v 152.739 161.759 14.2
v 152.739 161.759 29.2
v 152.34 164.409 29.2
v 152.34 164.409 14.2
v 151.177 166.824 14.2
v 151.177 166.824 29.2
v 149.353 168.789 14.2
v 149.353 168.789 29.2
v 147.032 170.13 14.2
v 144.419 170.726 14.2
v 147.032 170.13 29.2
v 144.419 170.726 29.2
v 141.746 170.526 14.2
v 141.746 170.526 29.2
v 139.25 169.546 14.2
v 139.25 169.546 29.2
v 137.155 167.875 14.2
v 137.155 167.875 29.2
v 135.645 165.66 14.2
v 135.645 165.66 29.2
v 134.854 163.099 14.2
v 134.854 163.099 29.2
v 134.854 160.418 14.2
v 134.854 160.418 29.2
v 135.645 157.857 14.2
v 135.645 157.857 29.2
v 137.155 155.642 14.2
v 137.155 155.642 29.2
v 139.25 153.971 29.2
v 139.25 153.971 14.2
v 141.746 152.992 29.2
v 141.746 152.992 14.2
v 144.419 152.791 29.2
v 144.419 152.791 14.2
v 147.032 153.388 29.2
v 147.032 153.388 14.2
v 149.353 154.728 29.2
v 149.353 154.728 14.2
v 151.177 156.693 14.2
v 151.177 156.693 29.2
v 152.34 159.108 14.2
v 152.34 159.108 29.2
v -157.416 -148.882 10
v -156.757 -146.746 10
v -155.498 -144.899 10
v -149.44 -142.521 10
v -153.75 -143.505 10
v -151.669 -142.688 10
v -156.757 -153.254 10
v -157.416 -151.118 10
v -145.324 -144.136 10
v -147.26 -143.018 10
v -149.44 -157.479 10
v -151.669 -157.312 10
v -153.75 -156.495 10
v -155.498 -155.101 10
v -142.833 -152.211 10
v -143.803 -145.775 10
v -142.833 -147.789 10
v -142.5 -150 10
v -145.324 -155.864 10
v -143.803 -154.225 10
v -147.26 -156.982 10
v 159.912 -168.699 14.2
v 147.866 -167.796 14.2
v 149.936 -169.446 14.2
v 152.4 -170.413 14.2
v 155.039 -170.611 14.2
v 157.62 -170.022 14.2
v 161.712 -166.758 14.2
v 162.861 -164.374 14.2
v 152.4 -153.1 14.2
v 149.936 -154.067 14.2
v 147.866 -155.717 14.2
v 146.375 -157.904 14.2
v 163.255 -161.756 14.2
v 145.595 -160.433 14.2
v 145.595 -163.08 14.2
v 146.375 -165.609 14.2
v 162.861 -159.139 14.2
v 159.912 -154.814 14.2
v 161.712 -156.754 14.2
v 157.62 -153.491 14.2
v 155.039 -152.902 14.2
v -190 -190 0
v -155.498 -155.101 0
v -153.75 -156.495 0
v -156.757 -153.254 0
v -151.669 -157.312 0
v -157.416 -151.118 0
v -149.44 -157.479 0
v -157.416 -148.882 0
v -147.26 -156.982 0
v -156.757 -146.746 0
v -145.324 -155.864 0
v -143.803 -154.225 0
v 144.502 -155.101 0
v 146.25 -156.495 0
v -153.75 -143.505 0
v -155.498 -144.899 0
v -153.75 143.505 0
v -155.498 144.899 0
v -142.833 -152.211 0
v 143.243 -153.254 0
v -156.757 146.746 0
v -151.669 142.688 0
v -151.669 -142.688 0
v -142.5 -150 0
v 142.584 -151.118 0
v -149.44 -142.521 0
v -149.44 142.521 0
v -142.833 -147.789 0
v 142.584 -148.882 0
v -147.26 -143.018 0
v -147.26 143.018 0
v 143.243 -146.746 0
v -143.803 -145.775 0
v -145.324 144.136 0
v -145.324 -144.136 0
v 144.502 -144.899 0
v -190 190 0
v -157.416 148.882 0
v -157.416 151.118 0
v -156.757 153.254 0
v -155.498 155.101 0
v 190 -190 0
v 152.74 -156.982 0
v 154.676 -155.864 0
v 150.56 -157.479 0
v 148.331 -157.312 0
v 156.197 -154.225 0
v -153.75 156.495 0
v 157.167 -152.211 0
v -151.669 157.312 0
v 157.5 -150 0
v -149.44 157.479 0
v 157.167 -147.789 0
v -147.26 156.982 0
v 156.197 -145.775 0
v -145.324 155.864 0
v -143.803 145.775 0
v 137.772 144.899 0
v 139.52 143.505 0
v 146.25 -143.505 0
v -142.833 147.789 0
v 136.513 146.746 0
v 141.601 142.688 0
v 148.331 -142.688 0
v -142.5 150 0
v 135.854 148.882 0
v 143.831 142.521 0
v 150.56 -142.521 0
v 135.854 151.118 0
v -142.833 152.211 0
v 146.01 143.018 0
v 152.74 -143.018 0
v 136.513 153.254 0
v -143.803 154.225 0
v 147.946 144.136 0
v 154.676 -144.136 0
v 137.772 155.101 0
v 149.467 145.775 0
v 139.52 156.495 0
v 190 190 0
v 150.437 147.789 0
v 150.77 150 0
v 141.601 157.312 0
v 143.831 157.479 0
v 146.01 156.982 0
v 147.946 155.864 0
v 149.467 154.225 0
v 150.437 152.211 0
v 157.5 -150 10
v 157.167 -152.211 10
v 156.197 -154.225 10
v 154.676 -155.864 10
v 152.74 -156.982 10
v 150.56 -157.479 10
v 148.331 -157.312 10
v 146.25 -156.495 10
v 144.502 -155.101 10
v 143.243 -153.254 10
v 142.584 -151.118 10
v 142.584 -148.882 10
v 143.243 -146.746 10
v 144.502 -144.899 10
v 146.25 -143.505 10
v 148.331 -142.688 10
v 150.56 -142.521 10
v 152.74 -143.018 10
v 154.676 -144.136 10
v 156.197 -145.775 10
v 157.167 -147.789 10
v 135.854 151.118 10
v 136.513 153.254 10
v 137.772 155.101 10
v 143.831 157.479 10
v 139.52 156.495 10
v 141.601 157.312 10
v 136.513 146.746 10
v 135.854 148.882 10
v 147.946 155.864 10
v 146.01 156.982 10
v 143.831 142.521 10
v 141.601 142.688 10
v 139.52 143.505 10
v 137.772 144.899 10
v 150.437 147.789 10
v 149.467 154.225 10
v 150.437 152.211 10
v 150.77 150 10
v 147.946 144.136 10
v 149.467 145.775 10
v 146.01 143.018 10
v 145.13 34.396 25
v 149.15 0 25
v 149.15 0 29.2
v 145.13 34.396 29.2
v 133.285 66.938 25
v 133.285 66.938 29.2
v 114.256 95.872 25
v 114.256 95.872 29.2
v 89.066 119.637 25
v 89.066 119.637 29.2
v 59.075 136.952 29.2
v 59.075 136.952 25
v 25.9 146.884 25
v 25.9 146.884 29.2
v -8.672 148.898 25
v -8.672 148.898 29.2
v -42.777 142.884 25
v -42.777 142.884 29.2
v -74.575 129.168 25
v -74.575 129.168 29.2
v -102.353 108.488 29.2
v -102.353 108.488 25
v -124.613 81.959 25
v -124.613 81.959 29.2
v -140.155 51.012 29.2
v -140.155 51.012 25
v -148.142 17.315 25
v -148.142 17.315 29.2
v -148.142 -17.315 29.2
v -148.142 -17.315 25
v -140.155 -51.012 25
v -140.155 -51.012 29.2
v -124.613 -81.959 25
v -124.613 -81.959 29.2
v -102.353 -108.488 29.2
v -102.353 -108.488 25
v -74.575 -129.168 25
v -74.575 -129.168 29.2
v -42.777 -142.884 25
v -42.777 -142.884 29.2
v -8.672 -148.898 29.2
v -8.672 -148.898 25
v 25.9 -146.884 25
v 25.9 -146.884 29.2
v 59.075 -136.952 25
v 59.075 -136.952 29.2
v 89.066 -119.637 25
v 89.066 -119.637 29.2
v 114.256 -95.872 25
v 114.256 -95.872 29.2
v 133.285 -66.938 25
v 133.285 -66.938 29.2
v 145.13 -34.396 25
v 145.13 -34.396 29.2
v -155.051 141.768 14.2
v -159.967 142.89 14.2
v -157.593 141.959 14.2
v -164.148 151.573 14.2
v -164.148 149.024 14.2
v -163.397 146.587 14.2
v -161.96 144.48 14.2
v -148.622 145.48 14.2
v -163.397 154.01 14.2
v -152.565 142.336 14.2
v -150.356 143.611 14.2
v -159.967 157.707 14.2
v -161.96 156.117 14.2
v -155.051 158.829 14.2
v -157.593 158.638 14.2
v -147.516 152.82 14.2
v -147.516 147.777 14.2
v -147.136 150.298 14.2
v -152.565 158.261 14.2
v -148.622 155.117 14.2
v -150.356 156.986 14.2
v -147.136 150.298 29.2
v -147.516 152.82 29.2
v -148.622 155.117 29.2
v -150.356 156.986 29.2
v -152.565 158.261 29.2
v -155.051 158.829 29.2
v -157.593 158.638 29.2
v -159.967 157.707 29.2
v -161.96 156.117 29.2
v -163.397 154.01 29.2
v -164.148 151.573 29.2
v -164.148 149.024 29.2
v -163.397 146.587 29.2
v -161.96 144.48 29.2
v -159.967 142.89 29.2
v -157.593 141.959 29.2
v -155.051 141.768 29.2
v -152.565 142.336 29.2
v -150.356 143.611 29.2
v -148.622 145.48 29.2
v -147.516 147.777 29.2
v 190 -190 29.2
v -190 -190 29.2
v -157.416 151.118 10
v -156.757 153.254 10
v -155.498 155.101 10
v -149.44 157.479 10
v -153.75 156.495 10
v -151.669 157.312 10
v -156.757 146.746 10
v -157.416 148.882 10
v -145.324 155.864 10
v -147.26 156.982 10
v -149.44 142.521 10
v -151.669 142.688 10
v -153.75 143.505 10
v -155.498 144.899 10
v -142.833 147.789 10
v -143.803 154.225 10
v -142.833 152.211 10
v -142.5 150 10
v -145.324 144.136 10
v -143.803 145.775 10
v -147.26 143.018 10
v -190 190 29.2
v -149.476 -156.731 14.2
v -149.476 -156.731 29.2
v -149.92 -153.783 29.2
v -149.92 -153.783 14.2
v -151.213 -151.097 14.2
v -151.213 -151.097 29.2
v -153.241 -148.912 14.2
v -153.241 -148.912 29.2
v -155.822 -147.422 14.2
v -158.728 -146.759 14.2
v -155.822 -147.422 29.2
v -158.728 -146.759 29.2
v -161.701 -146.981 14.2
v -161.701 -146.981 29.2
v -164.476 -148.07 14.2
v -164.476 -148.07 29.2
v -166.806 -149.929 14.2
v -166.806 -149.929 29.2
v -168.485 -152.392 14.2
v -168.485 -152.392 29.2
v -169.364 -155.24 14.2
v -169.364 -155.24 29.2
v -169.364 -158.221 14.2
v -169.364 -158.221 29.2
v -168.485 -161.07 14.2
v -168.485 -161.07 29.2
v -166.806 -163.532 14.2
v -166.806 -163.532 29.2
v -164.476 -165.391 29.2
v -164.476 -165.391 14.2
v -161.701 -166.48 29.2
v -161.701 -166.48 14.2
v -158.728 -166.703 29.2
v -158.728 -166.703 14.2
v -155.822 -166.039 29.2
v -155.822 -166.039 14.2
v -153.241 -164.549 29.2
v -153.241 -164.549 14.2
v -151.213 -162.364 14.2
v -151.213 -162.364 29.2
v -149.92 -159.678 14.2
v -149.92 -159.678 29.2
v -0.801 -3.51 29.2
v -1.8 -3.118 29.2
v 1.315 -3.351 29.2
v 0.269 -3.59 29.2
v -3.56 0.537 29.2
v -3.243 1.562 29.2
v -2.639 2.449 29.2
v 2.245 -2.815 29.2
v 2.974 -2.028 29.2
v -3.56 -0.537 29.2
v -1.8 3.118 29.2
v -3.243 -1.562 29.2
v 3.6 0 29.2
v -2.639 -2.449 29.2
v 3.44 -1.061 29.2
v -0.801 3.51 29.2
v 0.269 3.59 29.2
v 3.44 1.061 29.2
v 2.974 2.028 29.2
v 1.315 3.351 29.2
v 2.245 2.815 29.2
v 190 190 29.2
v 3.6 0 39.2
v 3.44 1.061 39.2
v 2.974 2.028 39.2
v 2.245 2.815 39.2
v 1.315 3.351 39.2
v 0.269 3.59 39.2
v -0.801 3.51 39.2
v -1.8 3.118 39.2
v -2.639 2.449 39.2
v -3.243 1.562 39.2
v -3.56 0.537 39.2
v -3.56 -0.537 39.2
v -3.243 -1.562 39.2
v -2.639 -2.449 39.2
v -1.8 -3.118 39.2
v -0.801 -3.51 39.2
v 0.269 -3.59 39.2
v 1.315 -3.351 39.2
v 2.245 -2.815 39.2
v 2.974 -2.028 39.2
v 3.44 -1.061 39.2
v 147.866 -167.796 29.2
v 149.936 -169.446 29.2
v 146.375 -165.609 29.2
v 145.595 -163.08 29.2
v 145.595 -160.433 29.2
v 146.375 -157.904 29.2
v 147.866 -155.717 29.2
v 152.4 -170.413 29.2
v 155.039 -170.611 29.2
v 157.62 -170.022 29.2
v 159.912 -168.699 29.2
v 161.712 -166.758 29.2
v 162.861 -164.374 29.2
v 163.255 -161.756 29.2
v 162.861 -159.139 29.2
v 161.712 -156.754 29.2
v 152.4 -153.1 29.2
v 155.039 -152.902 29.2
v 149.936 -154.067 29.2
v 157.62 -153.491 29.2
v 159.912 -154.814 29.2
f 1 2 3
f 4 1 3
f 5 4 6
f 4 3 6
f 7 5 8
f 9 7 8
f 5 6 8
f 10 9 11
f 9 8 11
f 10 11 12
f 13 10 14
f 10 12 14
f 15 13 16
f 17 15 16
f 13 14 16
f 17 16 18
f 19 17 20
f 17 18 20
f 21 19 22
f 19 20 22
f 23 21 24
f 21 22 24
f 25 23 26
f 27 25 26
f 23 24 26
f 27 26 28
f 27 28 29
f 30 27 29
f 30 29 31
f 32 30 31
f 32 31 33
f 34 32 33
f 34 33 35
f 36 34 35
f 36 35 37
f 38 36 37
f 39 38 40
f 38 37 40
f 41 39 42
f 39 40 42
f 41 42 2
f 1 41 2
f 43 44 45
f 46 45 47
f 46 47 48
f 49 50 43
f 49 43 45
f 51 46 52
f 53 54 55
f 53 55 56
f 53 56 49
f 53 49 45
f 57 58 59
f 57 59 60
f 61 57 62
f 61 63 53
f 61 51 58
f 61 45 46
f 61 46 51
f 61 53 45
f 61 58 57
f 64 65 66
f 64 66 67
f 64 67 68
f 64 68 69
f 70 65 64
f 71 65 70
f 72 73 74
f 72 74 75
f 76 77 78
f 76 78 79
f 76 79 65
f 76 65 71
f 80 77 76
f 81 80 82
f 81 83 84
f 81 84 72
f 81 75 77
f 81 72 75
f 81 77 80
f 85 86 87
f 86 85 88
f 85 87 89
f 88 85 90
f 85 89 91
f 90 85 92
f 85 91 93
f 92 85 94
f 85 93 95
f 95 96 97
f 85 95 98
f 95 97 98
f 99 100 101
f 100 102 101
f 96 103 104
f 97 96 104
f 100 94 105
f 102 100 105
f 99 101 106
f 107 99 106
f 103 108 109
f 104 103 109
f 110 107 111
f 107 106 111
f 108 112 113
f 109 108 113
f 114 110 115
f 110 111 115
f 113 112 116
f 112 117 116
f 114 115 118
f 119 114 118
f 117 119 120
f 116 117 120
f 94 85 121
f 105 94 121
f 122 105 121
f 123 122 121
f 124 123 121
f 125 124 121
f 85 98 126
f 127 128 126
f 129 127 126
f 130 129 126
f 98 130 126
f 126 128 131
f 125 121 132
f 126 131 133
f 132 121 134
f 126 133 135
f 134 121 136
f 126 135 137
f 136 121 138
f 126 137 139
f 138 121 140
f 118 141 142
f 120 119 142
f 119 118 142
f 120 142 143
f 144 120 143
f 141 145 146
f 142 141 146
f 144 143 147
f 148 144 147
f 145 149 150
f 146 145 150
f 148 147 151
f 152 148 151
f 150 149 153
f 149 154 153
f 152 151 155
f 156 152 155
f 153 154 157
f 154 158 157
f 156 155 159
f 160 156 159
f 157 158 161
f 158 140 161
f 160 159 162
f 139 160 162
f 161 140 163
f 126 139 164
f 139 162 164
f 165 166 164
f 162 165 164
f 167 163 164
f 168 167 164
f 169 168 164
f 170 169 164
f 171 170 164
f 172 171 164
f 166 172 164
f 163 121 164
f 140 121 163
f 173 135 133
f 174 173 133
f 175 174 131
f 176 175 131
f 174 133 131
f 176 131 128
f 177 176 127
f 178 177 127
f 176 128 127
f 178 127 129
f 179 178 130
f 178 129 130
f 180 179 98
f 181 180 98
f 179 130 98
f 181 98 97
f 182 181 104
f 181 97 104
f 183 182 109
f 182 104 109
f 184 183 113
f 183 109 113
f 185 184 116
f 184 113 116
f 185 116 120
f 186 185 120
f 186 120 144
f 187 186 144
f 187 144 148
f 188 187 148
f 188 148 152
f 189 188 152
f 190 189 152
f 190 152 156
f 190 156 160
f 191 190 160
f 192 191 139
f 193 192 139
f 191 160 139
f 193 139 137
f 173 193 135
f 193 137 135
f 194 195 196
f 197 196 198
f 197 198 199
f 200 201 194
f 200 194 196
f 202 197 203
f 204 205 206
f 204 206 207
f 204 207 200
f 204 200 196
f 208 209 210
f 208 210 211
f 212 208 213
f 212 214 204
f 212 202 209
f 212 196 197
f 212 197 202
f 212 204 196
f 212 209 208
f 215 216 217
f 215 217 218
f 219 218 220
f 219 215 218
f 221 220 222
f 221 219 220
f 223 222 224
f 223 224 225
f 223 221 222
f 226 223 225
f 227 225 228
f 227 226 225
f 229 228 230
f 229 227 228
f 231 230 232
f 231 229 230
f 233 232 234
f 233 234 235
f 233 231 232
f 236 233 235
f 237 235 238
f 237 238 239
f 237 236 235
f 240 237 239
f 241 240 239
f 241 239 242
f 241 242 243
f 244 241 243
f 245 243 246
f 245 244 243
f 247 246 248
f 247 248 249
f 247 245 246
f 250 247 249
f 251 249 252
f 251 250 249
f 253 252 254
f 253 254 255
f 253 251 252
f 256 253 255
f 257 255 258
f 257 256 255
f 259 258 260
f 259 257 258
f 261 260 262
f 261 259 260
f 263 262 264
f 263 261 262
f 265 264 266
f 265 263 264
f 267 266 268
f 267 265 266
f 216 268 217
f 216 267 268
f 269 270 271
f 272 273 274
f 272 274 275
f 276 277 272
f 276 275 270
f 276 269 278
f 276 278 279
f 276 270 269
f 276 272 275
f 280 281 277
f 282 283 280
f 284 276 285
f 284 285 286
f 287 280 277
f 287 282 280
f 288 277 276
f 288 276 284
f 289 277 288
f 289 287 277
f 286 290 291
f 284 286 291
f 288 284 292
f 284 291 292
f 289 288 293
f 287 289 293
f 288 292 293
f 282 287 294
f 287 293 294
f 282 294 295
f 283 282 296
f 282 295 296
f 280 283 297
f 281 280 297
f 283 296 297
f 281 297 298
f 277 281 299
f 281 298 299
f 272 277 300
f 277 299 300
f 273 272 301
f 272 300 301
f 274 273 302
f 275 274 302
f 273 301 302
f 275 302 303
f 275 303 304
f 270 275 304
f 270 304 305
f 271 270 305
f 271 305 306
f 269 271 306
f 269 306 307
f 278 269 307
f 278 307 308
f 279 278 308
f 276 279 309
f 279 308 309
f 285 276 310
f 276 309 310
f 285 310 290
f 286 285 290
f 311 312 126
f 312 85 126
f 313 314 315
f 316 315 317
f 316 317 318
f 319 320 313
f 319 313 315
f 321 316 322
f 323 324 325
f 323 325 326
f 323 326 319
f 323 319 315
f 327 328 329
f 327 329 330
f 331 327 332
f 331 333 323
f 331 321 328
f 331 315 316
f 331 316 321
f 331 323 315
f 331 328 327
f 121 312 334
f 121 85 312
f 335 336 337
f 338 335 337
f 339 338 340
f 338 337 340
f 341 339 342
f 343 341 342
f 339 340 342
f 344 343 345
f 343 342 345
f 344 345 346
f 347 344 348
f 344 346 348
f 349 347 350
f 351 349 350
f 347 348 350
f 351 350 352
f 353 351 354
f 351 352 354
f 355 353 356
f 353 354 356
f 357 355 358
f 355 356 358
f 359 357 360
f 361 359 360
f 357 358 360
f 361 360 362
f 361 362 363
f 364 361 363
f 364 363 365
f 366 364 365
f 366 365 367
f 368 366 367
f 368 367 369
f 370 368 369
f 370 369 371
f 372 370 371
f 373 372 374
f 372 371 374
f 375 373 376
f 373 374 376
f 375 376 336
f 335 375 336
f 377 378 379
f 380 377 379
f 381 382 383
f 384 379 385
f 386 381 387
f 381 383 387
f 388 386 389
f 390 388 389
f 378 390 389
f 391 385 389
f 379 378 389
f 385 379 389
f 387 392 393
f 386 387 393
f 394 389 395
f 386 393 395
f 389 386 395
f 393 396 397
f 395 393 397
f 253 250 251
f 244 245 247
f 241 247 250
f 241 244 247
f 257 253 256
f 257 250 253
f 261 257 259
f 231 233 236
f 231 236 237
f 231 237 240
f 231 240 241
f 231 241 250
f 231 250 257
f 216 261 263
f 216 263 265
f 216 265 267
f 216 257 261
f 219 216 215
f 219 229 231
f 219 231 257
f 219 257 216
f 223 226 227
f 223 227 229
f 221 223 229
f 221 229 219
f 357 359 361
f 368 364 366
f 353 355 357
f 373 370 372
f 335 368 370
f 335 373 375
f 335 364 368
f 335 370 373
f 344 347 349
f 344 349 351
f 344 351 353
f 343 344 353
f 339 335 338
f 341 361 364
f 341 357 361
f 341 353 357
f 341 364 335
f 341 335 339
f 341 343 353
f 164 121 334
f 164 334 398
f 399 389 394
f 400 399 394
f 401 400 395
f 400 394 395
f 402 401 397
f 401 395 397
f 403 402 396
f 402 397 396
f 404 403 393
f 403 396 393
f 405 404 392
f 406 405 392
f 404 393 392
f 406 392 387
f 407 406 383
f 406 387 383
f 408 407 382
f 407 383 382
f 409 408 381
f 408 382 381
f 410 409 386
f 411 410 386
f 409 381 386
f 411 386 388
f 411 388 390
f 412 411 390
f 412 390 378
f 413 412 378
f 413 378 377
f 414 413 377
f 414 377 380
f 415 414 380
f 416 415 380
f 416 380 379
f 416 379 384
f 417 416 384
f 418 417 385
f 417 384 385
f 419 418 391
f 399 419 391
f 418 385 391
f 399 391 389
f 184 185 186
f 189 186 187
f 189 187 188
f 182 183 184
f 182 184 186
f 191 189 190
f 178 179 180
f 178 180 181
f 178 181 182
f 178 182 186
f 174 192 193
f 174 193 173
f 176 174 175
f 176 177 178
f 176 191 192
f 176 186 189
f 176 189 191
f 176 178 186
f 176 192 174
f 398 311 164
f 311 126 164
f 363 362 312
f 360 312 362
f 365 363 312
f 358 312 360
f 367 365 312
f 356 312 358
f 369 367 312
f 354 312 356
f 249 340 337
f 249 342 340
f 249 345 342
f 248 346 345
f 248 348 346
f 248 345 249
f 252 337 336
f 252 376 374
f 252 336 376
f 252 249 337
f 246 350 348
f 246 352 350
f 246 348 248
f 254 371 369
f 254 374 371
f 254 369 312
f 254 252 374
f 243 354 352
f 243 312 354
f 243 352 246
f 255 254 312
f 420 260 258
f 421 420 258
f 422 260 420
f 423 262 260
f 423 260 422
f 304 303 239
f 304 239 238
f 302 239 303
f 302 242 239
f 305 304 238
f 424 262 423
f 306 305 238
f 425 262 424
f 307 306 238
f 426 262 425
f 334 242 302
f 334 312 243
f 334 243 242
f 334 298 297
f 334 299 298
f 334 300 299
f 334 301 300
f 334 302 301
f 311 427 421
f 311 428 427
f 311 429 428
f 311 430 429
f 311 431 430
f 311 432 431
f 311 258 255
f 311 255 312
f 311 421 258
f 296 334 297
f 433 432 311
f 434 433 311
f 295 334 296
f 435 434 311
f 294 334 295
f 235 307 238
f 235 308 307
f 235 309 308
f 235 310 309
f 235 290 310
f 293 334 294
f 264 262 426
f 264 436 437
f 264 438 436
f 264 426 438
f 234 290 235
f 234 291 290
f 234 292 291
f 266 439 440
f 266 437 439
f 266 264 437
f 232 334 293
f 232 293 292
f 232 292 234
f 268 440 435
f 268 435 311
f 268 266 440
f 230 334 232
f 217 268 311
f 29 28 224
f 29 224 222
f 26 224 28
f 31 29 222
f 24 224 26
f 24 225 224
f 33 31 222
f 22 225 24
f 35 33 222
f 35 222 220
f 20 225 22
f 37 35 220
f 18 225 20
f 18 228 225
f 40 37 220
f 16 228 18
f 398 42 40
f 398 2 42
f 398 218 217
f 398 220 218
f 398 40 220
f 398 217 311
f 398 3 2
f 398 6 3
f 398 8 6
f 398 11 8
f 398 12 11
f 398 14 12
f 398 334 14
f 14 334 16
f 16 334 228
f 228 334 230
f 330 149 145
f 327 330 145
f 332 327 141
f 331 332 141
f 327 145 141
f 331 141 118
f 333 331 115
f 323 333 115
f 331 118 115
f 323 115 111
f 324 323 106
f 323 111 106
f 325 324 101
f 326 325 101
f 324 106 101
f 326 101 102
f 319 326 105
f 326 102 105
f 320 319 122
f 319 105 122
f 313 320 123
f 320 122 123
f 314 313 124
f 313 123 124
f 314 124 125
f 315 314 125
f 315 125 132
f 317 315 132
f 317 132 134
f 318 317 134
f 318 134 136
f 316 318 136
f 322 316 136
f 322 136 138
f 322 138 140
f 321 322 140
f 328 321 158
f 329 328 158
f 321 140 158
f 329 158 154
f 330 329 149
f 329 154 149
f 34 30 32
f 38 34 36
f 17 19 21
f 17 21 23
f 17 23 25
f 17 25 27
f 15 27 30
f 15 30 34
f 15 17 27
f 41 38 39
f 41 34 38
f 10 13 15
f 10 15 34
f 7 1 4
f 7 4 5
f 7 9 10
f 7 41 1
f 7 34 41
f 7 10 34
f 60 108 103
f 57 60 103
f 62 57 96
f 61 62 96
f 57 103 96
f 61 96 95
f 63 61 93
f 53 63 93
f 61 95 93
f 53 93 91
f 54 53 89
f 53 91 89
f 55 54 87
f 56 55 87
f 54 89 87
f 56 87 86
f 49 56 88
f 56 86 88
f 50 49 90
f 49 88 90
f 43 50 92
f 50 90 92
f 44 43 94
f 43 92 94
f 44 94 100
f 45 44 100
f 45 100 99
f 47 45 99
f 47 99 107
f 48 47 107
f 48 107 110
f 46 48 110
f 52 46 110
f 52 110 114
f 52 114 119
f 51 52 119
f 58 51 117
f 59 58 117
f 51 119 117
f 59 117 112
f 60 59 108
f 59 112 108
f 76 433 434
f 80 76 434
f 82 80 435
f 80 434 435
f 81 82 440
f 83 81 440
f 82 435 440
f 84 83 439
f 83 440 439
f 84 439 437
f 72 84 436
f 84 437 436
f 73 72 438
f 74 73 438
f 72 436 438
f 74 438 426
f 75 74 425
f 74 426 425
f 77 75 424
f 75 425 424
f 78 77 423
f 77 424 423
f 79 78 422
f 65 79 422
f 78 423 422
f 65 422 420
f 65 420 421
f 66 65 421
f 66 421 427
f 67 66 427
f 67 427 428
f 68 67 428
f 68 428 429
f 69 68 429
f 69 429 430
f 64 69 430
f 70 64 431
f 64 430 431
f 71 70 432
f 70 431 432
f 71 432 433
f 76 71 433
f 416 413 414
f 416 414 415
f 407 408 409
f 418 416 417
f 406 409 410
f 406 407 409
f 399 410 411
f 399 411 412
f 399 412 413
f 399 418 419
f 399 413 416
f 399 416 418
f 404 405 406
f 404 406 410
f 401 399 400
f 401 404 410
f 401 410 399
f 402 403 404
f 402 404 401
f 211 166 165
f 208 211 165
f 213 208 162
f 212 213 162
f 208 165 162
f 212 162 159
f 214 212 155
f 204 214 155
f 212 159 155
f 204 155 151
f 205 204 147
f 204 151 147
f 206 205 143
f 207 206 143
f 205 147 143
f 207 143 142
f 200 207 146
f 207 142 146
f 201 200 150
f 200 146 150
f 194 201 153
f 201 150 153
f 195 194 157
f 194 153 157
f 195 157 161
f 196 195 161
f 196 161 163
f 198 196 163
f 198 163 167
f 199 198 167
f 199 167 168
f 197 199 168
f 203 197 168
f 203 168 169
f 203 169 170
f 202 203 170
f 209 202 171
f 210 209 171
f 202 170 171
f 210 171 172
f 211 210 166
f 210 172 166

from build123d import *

# Parameters (mm, degrees)
F0_W      = 380
F0_H      = 380
F2_DEPTH  = 25
F1_R      = 149.15
F1_R_2    = 3.6
F3_DEPTH  = 4.2
F4_W      = 380
F4_H      = 380
F4_R      = 149.15
F5_DEPTH  = 4.2
F7_R      = 7.5
F8_DEPTH  = 10
F9_R      = 8.554125
F9_R_2    = 8.992522
F9_R_3    = 8.87954
F9_R_4    = 10
F10_DEPTH = 15
F6_R      = 3.6
F11_DEPTH = 10


with BuildPart() as f2:
    # F0 (on Top) → F2 (new body)
    with BuildSketch(Plane.XY):
        Rectangle(F0_W, F0_H)
    extrude(amount=F2_DEPTH)

    # F1 (on face) → F3 (join)
    with BuildSketch(Plane.XY):
        Circle(F1_R)
        Circle(F1_R_2, mode=Mode.SUBTRACT)
    extrude(amount=F3_DEPTH)

    # F4 (on face) → F5 (join)
    with BuildSketch(Plane.XY.offset(25)):
        Rectangle(F4_W, F4_H)
        Circle(F4_R, mode=Mode.SUBTRACT)
    extrude(amount=F5_DEPTH)

    # F7 (on face) → F8 (cut)
    with BuildSketch(Plane(origin=(0, 0, 0), x_dir=(1, 0, 0), z_dir=(0, 0, -1))):
        with Locations((-150, 150)):
            Circle(F7_R)
        with Locations((-150, -150)):
            Circle(F7_R)
        with Locations((143.270284, -150)):
            Circle(F7_R)
        with Locations((150, 150)):
            Circle(F7_R)
    extrude(amount=-F8_DEPTH, mode=Mode.SUBTRACT)

    # F9 (on face) → F10 (cut)
    with BuildSketch(Plane.XY.offset(29.2)):
        with Locations((-155.689882, 150.298438)):
            Circle(F9_R)
        with Locations((143.746577, 161.758714)):
            Circle(F9_R_2)
        with Locations((154.375539, -161.756462)):
            Circle(F9_R_3)
        with Locations((-159.475569, -156.73067)):
            Circle(F9_R_4)
    extrude(amount=-F10_DEPTH, mode=Mode.SUBTRACT)


with BuildPart() as f11:
    # F6 (on face) → F11 (new body)
    with BuildSketch(Plane.XY.offset(29.2)):
        Circle(F6_R)
    extrude(amount=F11_DEPTH)


solid = Compound([f2.part, f11.part])
